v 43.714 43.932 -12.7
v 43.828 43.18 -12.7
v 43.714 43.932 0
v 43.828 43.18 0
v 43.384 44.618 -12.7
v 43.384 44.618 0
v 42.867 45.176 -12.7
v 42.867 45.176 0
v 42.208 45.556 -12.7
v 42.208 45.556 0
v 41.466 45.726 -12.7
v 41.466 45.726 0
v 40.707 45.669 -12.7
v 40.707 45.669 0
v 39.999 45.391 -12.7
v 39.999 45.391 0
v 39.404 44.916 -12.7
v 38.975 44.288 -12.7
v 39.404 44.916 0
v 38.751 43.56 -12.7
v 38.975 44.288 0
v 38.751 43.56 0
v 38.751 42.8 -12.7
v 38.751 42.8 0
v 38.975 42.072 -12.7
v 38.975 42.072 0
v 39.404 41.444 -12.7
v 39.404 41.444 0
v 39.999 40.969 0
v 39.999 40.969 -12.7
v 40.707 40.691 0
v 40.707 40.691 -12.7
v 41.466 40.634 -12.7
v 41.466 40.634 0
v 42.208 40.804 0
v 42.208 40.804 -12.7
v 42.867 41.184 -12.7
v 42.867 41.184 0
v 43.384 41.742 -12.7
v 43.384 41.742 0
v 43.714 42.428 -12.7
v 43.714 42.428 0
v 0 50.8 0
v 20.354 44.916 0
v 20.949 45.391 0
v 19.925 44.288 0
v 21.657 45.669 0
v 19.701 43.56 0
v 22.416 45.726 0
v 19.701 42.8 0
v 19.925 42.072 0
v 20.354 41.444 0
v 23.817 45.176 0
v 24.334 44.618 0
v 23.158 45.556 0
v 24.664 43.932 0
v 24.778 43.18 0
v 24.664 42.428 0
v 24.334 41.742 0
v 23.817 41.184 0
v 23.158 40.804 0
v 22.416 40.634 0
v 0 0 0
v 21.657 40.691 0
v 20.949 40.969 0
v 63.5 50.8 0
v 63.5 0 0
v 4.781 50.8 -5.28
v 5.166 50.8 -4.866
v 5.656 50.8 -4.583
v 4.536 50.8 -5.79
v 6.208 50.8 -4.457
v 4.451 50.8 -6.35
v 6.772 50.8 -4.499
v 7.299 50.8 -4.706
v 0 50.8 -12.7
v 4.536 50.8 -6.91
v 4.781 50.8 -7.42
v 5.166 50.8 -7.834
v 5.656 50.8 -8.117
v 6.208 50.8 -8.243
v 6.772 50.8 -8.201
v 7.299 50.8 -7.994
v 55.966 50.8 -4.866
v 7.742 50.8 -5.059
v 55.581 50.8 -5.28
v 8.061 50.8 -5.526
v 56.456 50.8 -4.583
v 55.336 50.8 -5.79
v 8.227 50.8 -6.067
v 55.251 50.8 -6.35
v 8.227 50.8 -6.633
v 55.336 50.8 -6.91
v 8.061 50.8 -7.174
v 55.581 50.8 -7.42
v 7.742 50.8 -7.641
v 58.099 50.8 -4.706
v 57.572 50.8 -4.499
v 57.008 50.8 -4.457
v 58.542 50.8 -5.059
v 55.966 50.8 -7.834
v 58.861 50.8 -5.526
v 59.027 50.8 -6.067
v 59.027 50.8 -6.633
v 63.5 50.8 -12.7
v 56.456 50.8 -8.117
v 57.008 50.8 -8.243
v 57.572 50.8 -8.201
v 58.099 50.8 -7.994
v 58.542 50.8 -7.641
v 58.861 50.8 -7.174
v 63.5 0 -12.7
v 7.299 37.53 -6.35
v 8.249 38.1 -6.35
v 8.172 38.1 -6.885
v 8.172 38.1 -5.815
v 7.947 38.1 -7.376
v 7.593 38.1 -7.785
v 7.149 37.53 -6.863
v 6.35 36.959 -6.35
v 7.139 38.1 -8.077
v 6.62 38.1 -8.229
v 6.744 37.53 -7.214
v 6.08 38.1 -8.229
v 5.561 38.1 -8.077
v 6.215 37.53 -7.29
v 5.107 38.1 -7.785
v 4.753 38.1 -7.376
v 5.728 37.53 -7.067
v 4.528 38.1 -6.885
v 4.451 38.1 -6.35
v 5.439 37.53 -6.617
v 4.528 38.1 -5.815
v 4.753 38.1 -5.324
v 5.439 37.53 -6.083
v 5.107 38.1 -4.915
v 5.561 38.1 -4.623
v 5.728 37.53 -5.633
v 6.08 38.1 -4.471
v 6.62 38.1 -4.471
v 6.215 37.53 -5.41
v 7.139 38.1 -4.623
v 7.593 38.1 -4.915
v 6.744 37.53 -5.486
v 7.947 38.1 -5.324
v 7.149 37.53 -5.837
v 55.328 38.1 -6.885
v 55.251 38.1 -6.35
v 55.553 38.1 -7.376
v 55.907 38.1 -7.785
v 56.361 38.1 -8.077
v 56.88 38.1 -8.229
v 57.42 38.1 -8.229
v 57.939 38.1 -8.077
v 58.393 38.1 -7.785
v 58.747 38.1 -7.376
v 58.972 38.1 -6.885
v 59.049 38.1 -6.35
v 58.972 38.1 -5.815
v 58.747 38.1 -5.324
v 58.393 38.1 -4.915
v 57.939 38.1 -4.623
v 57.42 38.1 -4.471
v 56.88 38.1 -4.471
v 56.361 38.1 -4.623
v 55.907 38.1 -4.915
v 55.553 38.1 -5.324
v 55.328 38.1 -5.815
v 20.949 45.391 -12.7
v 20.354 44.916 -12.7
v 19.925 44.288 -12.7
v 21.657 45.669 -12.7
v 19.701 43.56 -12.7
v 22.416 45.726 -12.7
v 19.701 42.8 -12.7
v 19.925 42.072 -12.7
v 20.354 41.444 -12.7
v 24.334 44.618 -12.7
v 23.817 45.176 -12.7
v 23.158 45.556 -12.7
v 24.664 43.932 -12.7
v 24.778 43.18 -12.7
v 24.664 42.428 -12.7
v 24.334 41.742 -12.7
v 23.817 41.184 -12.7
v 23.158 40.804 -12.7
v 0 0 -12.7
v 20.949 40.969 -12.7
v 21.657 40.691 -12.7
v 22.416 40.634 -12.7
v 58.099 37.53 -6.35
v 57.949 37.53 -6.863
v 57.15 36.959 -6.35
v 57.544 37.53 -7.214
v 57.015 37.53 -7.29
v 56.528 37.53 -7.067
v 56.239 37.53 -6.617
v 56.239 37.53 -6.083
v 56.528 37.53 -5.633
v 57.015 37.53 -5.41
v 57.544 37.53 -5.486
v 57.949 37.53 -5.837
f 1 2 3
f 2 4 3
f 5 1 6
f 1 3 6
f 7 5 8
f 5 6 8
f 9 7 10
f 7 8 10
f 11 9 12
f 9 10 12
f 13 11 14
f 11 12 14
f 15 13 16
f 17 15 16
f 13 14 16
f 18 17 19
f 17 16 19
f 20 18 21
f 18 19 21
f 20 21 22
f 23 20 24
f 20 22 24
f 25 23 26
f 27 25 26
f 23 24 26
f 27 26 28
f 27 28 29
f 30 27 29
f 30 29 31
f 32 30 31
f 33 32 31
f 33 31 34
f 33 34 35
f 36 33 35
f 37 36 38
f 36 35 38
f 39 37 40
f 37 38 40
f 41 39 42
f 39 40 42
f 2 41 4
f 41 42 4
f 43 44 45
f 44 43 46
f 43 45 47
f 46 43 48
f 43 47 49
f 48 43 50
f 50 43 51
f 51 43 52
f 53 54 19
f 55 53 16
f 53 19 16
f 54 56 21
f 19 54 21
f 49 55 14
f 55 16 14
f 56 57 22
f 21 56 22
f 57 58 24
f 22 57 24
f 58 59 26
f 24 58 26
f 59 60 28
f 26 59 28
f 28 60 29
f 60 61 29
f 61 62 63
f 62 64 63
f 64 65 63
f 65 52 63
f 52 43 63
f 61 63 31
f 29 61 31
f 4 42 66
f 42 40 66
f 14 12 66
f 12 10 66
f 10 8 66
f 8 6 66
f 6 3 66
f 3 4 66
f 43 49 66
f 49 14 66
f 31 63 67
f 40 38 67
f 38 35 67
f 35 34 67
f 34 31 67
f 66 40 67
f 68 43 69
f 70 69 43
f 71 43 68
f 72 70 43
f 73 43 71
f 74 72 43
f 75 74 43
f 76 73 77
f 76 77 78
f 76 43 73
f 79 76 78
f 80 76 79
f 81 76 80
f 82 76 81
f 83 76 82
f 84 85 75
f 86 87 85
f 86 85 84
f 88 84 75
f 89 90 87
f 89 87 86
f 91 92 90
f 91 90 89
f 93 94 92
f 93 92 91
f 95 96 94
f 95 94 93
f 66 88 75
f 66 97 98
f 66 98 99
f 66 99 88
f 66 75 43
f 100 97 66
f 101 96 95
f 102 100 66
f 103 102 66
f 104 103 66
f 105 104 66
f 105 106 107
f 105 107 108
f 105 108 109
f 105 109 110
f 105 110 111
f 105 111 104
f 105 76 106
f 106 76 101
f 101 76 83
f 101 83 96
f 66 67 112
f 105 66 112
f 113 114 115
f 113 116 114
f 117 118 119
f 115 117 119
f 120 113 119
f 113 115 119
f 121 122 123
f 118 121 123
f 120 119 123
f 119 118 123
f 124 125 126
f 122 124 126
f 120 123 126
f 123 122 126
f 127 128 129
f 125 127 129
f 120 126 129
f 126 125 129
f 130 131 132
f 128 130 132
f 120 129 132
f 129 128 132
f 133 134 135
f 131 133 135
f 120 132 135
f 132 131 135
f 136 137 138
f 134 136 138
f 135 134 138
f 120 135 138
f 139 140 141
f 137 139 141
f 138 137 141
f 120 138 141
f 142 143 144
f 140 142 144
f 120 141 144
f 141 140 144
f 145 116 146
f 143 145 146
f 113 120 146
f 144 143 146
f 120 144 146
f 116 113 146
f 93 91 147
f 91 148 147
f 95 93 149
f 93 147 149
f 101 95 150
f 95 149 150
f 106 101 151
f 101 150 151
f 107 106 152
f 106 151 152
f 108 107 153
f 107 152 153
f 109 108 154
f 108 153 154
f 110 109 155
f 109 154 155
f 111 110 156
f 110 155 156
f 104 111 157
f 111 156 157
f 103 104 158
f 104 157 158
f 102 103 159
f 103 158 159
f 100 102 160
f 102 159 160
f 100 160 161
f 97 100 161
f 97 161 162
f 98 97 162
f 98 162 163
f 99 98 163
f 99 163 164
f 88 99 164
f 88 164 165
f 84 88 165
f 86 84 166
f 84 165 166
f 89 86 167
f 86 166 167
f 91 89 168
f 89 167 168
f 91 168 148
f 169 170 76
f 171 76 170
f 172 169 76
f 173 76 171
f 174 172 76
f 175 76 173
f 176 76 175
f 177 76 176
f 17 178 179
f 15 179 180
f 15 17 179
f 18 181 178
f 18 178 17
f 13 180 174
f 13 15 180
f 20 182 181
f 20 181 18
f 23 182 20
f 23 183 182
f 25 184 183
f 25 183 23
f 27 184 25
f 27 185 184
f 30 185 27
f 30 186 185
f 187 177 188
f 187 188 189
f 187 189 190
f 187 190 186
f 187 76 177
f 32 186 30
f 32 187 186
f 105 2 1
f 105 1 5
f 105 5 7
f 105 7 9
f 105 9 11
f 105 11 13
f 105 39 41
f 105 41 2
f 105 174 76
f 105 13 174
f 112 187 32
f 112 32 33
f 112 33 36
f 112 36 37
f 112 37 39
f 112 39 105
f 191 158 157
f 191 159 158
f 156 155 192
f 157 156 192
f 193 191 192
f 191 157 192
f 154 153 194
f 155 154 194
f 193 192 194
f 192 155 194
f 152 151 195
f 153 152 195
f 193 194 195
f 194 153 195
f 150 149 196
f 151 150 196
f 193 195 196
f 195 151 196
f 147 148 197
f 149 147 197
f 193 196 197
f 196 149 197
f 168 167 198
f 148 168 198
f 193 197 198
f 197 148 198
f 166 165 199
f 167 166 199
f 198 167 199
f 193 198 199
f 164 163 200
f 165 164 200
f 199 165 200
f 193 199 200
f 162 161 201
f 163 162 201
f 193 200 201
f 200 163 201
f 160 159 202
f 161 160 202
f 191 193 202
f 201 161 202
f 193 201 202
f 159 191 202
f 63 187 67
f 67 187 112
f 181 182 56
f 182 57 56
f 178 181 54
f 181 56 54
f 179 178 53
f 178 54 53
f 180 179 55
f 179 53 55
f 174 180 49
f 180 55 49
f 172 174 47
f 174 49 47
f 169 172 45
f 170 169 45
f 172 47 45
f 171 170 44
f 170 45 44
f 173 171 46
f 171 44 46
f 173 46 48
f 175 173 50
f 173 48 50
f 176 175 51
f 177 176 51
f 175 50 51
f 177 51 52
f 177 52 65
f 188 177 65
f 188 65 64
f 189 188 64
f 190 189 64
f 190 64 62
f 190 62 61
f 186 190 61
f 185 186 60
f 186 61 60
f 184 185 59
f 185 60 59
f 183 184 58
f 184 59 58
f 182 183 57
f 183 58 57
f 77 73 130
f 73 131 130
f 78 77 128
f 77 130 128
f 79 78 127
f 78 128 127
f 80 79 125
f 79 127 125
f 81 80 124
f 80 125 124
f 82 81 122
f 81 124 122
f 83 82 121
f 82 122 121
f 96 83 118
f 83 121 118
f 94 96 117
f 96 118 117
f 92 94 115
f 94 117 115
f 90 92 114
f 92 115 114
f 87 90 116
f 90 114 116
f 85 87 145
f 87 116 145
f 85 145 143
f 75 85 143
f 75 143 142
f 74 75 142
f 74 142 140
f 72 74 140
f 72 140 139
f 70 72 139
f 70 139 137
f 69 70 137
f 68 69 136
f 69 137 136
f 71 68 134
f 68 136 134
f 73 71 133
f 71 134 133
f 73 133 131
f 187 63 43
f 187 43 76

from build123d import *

# Parameters (mm, degrees)
SKETCH1_W                        = 63.5
SKETCH1_H                        = 12.7
BOSS_EXTRUDE1_DEPTH              = 50.8
F_25_0_1495_DIAMETER_HOLE1_D     = 3.7973
F_25_0_1495_DIAMETER_HOLE1_DEPTH = 12.7
F_25_0_1495_DIAMETER_HOLE1_TIP   = 1.140824014
F_7_0_201_DIAMETER_HOLE1_D       = 5.1054
F_7_0_201_DIAMETER_HOLE1_DEPTH   = 12.7
F_7_0_201_DIAMETER_HOLE1_TIP     = 1.533816902


with BuildPart() as part:
    # Sketch1 → Boss-Extrude1 (new body)
    with BuildSketch(Plane(origin=(0, 0, 0), x_dir=(1, 0, 0), z_dir=(0, 1, 0))):
        with Locations((31.75, 6.35)):
            Rectangle(SKETCH1_W, SKETCH1_H)
    extrude(amount=BOSS_EXTRUDE1_DEPTH)

    # #25 (0.1495) Diameter Hole1
    with Locations(Plane(origin=(0, 50.8, 0), x_dir=(1, 0, 0), z_dir=(0, 1, 0))):
        with Locations((6.35, 6.35), (57.15, 6.35)):
            Hole(F_25_0_1495_DIAMETER_HOLE1_D / 2, depth=F_25_0_1495_DIAMETER_HOLE1_DEPTH)
            with Locations((0, 0, -(F_25_0_1495_DIAMETER_HOLE1_DEPTH + F_25_0_1495_DIAMETER_HOLE1_TIP / 2))):  # 118° drill point
                Cone(0, F_25_0_1495_DIAMETER_HOLE1_D / 2, F_25_0_1495_DIAMETER_HOLE1_TIP, mode=Mode.SUBTRACT)

    # #7 (0.201) Diameter Hole1
    with Locations(Plane(origin=(0, 0, -12.7), x_dir=(-1, 0, 0), z_dir=(0, 0, -1))):
        with Locations((-22.225, 43.18), (-41.275, 43.18)):
            Hole(F_7_0_201_DIAMETER_HOLE1_D / 2, depth=F_7_0_201_DIAMETER_HOLE1_DEPTH)
            with Locations((0, 0, -(F_7_0_201_DIAMETER_HOLE1_DEPTH + F_7_0_201_DIAMETER_HOLE1_TIP / 2))):  # 118° drill point
                Cone(0, F_7_0_201_DIAMETER_HOLE1_D / 2, F_7_0_201_DIAMETER_HOLE1_TIP, mode=Mode.SUBTRACT)


solid = part.part
